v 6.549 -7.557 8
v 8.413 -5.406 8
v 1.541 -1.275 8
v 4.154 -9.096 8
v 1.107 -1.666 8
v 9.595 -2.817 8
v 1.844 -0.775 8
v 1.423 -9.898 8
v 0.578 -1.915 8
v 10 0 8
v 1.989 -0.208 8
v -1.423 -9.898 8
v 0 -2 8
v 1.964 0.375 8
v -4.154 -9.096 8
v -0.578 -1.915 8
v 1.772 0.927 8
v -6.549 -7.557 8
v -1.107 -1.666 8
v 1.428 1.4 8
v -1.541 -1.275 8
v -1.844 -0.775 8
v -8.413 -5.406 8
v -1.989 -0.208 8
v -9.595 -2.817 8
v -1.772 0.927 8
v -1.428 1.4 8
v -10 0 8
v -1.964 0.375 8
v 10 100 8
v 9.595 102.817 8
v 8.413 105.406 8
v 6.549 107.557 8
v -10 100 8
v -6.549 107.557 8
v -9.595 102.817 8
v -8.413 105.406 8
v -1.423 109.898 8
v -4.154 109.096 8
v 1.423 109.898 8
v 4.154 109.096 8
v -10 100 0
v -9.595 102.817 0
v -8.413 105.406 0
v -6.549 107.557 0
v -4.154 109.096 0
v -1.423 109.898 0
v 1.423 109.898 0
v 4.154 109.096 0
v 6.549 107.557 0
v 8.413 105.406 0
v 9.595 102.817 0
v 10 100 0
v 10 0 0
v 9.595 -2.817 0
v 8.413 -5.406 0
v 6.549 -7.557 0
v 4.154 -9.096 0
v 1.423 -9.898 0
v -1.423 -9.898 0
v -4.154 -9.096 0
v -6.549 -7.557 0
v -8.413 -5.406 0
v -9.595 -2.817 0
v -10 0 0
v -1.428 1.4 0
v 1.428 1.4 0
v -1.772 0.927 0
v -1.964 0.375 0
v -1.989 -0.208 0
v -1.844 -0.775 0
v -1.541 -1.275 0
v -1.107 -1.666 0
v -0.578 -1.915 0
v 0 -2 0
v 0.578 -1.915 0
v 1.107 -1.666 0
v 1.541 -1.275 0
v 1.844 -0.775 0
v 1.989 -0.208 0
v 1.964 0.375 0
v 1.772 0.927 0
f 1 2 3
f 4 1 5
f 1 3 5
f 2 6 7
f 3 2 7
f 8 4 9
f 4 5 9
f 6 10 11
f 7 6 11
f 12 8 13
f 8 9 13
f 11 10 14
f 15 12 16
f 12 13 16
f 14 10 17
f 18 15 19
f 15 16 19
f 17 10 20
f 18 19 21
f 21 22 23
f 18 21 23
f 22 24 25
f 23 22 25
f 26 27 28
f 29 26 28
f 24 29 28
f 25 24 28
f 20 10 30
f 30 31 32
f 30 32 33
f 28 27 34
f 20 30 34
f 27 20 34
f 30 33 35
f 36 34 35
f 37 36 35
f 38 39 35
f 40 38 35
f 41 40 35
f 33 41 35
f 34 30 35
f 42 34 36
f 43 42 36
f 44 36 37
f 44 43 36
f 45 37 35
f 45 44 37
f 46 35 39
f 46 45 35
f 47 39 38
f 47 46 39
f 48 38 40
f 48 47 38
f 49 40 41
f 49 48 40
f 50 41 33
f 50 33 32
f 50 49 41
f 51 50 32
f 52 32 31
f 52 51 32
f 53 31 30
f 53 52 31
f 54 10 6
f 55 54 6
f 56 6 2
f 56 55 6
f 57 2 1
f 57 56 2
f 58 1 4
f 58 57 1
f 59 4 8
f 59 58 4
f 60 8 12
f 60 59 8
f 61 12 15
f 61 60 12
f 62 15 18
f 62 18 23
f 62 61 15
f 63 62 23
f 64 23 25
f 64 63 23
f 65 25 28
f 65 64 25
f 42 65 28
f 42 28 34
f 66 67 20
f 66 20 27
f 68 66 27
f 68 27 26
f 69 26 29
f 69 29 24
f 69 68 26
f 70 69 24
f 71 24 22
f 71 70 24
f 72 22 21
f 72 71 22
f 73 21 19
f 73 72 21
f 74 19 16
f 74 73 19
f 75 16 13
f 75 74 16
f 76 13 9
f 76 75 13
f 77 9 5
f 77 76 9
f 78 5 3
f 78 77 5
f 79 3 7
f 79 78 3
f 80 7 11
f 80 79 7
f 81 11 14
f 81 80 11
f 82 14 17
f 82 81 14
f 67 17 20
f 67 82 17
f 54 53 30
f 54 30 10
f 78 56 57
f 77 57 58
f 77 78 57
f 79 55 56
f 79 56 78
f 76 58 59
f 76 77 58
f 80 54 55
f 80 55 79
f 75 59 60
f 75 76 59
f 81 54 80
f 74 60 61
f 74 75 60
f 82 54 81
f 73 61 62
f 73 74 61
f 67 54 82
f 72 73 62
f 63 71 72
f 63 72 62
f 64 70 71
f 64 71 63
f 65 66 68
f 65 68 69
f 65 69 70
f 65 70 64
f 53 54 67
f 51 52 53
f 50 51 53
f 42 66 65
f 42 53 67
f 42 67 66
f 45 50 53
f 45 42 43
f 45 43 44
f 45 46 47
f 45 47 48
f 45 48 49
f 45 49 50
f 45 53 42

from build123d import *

# Parameters (mm, degrees)
SALIENTE_EXTRUIR1_DEPTH = 8


with BuildPart() as part:
    # Croquis3 → Saliente-Extruir1 (new body)
    with BuildSketch(Plane.XY):
        with BuildLine():
            Line((10, 100), (10, 0))
            ThreePointArc((10, 0), (0, -10), (-10, 0))
            Line((-10, 0), (-10, 100))
            ThreePointArc((-10, 100), (0, 110), (10, 100))
        make_face()
        with BuildLine():
            ThreePointArc((-1.428285686, 1.4), (0, -2), (1.428285686, 1.4))
            Line((1.428285686, 1.4), (-1.428285686, 1.4))
        make_face(mode=Mode.SUBTRACT)
    extrude(amount=SALIENTE_EXTRUIR1_DEPTH)


solid = part.part
